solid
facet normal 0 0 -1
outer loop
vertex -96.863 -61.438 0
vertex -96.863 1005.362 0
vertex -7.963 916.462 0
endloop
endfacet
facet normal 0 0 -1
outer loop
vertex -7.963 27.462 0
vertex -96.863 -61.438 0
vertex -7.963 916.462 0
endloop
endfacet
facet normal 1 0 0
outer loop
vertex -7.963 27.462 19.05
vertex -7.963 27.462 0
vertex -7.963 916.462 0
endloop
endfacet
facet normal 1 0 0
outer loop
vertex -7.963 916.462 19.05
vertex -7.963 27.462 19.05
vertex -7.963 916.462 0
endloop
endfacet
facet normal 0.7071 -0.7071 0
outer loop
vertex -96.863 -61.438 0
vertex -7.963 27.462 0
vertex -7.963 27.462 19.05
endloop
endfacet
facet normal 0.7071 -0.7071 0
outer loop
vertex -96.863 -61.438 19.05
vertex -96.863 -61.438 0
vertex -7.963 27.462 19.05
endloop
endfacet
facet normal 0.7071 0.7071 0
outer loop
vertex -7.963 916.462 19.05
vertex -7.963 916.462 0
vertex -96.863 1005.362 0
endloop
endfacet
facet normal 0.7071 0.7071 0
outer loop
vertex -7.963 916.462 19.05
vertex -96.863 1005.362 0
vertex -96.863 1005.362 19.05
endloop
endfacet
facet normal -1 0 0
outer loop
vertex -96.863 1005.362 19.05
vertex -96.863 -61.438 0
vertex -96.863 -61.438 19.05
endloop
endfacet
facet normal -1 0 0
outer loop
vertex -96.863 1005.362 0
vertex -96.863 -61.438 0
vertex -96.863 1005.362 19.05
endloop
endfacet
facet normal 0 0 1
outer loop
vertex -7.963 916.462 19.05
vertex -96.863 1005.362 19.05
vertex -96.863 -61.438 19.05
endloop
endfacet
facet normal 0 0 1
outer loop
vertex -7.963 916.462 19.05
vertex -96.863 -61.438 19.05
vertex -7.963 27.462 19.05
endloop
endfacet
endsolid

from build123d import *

# Parameters (mm, degrees)
F0_W     = 88.9
F0_H     = 1066.8
F1_DEPTH = 19.05
F2_SIZE  = 88.89999
F3_SIZE  = 88.89999


# Not quite as in the source:
# - a fillet or chamfer is up to 0.001 mm smaller than in the source, because OpenCascade refuses the exact size


with BuildPart() as f1:
    # F0 (on Top) → F1 (new body)
    with BuildSketch(Plane.XY):
        with Locations((-52.413374114, 471.9619610548)):
            Rectangle(F0_W, F0_H)
    extrude(amount=F1_DEPTH)

    # F2 (size 88.9 in the source; OpenCascade refuses exactly that, so slightly less here)
    f2_edges = [f1.edges().sort_by_distance(p)[0] for p in [
        (-7.963374, -61.438039, 9.525),
    ]]
    chamfer(f2_edges, length=F2_SIZE)

    # F3 (size 88.9 in the source; OpenCascade refuses exactly that, so slightly less here)
    f3_edges = [f1.edges().sort_by_distance(p)[0] for p in [
        (-7.963374, 1005.361961, 9.525),
    ]]
    chamfer(f3_edges, length=F3_SIZE)


solid = f1.part
